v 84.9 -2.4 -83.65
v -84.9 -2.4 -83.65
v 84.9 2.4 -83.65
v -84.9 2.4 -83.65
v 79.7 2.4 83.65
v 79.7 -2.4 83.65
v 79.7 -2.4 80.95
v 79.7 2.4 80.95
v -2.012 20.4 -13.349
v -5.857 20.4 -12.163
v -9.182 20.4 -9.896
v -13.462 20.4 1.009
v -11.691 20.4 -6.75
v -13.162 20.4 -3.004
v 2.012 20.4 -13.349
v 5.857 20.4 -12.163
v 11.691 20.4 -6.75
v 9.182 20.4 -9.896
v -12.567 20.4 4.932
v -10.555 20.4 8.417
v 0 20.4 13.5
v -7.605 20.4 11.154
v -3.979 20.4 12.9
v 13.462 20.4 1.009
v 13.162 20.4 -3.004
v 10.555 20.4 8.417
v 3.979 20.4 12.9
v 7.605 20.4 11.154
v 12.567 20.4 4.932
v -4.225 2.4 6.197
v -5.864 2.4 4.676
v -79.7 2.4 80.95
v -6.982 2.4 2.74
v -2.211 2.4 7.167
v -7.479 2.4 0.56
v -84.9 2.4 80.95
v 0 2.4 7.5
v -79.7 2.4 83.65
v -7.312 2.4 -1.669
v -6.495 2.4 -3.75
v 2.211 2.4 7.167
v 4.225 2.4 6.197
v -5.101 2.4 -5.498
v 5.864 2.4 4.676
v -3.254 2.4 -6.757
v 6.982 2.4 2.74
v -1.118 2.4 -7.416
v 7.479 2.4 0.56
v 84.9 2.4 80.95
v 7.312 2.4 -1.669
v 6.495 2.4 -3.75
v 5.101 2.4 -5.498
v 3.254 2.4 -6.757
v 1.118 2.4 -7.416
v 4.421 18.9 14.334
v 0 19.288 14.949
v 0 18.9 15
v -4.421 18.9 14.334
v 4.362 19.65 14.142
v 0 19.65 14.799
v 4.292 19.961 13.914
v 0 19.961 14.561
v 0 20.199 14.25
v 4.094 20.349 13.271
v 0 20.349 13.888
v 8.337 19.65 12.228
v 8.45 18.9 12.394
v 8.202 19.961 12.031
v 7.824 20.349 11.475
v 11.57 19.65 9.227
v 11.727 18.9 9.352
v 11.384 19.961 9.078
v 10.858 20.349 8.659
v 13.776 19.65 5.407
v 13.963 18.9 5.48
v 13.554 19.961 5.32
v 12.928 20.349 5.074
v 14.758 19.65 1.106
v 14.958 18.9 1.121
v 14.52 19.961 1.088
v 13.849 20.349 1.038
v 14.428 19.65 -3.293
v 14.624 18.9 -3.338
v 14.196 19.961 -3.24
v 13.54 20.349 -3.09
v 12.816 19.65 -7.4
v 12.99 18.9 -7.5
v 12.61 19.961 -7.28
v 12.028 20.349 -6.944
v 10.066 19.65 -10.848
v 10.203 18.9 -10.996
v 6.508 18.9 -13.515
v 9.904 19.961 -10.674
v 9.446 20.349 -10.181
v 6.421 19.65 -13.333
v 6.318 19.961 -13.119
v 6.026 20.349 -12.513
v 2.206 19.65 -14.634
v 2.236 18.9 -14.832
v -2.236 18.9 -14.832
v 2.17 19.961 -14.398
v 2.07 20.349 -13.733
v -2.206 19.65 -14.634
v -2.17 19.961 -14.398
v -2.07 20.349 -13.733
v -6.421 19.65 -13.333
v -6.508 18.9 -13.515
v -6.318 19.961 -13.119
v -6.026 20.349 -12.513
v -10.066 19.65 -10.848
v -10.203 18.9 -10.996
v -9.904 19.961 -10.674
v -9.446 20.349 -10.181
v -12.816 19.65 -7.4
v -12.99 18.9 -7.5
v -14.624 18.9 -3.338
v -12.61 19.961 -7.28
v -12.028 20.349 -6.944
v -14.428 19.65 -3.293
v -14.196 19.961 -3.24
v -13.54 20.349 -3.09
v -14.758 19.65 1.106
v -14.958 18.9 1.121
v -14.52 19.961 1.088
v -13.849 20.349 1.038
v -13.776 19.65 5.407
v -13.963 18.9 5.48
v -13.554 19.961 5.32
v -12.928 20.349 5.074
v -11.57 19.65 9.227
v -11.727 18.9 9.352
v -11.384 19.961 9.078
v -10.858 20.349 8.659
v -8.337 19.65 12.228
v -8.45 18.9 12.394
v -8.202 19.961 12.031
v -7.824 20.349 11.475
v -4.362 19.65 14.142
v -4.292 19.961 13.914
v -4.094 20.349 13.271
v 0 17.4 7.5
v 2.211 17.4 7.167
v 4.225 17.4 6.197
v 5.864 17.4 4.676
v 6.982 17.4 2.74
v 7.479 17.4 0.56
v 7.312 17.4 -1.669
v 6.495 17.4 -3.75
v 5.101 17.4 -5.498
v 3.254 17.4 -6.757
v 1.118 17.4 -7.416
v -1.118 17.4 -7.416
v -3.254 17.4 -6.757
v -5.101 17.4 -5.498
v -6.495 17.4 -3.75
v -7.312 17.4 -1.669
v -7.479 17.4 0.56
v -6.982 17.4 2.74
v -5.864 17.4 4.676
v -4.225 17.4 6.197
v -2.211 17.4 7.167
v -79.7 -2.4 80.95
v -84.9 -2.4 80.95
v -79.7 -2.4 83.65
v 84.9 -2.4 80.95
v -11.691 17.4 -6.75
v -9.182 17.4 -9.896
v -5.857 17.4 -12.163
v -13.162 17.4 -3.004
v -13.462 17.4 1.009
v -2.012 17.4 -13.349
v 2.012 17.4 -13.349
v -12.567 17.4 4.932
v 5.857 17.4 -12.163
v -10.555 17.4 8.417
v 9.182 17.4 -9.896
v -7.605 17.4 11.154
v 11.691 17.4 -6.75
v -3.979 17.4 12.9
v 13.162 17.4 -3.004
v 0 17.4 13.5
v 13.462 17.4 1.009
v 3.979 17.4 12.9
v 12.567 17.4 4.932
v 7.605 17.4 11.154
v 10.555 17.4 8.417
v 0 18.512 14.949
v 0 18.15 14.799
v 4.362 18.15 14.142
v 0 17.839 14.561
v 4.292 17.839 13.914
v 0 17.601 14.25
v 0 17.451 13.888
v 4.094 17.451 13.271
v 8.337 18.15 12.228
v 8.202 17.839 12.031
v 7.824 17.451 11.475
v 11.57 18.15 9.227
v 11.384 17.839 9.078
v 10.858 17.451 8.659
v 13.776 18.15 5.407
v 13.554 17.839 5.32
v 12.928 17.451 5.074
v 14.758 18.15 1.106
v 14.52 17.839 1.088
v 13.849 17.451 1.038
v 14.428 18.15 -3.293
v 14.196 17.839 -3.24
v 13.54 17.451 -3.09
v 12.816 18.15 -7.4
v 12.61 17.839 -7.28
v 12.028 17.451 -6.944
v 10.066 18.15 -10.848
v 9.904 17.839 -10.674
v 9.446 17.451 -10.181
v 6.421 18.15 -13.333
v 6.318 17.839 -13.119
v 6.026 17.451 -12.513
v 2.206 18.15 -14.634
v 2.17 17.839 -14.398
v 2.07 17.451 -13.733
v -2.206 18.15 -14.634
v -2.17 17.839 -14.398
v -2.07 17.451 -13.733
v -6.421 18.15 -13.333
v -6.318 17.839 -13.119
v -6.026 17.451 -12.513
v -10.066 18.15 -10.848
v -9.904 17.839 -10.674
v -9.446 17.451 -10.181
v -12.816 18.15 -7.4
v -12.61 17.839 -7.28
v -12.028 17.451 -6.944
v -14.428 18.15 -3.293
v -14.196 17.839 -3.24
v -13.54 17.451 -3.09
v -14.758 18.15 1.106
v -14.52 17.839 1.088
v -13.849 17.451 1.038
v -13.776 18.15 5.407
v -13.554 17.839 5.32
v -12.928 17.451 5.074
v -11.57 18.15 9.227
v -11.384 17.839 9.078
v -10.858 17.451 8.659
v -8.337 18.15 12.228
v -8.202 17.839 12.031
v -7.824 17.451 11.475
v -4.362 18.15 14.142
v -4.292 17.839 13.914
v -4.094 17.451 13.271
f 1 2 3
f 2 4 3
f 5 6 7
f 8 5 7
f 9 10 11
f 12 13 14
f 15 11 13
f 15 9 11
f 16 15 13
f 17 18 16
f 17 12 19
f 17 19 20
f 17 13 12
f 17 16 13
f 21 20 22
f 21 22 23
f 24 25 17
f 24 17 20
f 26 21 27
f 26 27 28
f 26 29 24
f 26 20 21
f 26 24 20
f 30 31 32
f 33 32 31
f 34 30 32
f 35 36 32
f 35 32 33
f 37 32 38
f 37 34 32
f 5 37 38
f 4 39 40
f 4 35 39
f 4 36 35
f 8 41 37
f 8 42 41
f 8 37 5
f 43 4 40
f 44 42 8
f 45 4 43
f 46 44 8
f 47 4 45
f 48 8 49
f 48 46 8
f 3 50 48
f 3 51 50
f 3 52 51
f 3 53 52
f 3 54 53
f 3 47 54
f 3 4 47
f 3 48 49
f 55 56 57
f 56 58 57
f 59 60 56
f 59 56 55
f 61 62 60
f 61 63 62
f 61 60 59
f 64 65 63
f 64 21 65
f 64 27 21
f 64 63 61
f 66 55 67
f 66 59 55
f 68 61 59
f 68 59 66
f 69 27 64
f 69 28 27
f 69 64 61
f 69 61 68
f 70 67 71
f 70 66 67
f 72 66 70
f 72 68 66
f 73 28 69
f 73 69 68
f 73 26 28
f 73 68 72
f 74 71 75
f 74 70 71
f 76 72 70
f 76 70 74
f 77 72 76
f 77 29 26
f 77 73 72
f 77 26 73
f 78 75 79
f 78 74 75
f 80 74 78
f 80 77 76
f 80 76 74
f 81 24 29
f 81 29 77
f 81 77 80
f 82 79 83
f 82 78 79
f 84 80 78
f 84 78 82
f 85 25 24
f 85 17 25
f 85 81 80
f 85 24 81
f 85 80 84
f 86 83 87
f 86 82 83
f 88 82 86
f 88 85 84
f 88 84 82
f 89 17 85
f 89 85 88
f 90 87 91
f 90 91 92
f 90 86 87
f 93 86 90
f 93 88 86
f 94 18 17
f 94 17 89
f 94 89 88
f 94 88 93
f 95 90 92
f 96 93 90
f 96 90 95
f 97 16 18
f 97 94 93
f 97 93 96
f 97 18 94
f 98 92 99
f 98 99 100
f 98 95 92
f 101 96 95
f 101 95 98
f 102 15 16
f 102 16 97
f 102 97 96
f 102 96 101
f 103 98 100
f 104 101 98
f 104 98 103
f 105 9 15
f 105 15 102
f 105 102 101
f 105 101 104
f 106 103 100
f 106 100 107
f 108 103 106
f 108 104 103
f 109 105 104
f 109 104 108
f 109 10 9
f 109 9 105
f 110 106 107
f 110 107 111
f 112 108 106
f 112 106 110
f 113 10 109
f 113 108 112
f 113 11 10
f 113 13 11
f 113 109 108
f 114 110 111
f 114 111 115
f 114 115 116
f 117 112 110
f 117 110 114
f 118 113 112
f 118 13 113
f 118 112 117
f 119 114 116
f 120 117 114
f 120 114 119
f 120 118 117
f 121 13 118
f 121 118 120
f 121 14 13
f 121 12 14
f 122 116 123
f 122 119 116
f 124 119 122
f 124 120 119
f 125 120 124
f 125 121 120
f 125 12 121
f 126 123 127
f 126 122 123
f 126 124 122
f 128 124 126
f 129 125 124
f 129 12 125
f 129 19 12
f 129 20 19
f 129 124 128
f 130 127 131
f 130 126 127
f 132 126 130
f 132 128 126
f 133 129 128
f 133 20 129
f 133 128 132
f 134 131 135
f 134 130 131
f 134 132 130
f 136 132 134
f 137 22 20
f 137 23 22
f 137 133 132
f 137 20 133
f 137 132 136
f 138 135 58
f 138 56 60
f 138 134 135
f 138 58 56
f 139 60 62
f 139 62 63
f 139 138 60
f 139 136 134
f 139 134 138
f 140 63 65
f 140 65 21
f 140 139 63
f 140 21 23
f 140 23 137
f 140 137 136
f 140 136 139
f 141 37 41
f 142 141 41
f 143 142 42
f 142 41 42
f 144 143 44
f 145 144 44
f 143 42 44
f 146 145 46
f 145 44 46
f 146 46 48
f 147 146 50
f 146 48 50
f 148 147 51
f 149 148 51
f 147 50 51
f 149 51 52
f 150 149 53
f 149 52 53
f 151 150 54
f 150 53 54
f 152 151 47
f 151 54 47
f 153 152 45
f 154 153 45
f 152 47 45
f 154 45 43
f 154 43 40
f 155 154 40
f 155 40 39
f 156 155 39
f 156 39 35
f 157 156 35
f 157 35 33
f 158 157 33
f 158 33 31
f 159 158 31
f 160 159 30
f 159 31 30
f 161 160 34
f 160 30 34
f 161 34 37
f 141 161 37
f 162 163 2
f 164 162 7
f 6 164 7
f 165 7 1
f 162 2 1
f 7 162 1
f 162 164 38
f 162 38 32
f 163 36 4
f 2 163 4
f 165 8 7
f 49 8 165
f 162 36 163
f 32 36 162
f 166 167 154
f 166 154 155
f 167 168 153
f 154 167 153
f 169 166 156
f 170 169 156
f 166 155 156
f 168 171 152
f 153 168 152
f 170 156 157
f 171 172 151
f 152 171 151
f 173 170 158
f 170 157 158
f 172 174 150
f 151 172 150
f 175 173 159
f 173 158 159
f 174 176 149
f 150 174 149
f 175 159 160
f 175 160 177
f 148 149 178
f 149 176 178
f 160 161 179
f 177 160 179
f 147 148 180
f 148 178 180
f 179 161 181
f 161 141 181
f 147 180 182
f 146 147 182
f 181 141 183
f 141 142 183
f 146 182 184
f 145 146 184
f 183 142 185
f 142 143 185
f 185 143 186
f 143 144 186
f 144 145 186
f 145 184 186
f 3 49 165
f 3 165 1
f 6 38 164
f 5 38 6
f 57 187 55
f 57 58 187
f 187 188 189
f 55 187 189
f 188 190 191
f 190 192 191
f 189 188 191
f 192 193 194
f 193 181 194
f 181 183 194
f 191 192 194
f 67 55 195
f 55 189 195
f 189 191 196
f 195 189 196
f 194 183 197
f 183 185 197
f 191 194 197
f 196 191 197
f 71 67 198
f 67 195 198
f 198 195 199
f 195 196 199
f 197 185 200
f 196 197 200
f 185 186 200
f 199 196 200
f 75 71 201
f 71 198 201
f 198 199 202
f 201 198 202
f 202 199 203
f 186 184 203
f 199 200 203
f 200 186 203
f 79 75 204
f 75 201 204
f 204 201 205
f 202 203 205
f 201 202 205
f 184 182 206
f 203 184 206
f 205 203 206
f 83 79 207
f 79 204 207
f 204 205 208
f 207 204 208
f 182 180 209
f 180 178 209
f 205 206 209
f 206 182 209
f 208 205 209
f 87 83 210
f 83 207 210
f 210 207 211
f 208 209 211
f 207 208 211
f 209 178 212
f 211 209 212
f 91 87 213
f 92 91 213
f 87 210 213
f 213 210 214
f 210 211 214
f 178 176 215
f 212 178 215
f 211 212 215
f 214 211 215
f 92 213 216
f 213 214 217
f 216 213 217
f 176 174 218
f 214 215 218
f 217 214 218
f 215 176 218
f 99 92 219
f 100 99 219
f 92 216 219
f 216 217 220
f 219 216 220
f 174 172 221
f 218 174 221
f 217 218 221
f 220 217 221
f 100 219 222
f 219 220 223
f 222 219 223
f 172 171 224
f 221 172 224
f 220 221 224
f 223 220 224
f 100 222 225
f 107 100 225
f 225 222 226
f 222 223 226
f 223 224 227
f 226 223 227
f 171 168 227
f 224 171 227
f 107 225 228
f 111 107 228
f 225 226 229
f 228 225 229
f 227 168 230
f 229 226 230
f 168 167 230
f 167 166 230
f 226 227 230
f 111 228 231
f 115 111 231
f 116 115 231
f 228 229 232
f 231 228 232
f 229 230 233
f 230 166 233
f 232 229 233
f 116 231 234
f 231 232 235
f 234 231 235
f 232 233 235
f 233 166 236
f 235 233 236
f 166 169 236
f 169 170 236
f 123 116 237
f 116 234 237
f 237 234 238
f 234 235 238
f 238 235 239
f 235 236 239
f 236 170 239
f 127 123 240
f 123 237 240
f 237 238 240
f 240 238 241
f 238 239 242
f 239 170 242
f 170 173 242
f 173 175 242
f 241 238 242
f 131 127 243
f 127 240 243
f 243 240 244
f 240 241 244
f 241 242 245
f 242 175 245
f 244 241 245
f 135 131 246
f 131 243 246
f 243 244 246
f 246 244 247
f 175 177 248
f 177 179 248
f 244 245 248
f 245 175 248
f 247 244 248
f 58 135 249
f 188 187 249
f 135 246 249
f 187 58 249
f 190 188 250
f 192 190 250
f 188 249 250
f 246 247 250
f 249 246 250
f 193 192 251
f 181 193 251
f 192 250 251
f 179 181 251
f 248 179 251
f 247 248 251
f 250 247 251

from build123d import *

# Parameters (mm, degrees)
SKETCH1_W           = 169.8
SKETCH1_H           = 167.3
BOSS_EXTRUDE1_DEPTH = 2.4
SKETCH2_R           = 7.5
BOSS_EXTRUDE2_DEPTH = 15
SKETCH6_R           = 15
BOSS_EXTRUDE4_DEPTH = 3
SKETCH7_W           = 5.2
SKETCH7_H           = 2.7
CUT_EXTRUDE1_DEPTH  = 121.537680831
FILLET2_R           = 1.5


with BuildPart() as part:
    # Sketch1 → Boss-Extrude1 (new, symmetric)
    with BuildSketch(Plane(origin=(0, 0, 0), x_dir=(1, 0, 0), z_dir=(0, 1, 0))):
        Rectangle(SKETCH1_W, SKETCH1_H)
    extrude(amount=BOSS_EXTRUDE1_DEPTH, both=True)

    # Sketch2 → Boss-Extrude2 (add)
    with BuildSketch(Plane(origin=(0, 2.4, 0), x_dir=(1, 0, 0), z_dir=(0, 1, 0))):
        with Locations(Location((0, 0, 0), (0, 0, 270))):
            Circle(SKETCH2_R)
    extrude(amount=BOSS_EXTRUDE2_DEPTH)

    # Sketch6 → Boss-Extrude4 (add)
    with BuildSketch(Plane(origin=(0, 17.4, 0), x_dir=(1, 0, 0), z_dir=(0, 1, 0))):
        with Locations(Location((0, 0, 0), (0, 0, 270))):
            Circle(SKETCH6_R)
    extrude(amount=BOSS_EXTRUDE4_DEPTH)

    # Sketch7 → Cut-Extrude1 (cut, through all)
    with BuildSketch(Plane(origin=(0, 2.4, 0), x_dir=(1, 0, 0), z_dir=(0, 1, 0))):
        with Locations((-82.3, -82.3)):
            Rectangle(SKETCH7_W, SKETCH7_H)
        with Locations((82.3, -82.3)):
            Rectangle(SKETCH7_W, SKETCH7_H)
    extrude(amount=-CUT_EXTRUDE1_DEPTH, mode=Mode.SUBTRACT)

    # Fillet2
    fillet2_edges = [part.edges().sort_by_distance(p)[0] for p in [
        (0, 17.4, -15),
        (0, 20.4, -15),
    ]]
    fillet(fillet2_edges, radius=FILLET2_R - 0.0001)  # a hair under: the kernel refuses the full size


solid = part.part
